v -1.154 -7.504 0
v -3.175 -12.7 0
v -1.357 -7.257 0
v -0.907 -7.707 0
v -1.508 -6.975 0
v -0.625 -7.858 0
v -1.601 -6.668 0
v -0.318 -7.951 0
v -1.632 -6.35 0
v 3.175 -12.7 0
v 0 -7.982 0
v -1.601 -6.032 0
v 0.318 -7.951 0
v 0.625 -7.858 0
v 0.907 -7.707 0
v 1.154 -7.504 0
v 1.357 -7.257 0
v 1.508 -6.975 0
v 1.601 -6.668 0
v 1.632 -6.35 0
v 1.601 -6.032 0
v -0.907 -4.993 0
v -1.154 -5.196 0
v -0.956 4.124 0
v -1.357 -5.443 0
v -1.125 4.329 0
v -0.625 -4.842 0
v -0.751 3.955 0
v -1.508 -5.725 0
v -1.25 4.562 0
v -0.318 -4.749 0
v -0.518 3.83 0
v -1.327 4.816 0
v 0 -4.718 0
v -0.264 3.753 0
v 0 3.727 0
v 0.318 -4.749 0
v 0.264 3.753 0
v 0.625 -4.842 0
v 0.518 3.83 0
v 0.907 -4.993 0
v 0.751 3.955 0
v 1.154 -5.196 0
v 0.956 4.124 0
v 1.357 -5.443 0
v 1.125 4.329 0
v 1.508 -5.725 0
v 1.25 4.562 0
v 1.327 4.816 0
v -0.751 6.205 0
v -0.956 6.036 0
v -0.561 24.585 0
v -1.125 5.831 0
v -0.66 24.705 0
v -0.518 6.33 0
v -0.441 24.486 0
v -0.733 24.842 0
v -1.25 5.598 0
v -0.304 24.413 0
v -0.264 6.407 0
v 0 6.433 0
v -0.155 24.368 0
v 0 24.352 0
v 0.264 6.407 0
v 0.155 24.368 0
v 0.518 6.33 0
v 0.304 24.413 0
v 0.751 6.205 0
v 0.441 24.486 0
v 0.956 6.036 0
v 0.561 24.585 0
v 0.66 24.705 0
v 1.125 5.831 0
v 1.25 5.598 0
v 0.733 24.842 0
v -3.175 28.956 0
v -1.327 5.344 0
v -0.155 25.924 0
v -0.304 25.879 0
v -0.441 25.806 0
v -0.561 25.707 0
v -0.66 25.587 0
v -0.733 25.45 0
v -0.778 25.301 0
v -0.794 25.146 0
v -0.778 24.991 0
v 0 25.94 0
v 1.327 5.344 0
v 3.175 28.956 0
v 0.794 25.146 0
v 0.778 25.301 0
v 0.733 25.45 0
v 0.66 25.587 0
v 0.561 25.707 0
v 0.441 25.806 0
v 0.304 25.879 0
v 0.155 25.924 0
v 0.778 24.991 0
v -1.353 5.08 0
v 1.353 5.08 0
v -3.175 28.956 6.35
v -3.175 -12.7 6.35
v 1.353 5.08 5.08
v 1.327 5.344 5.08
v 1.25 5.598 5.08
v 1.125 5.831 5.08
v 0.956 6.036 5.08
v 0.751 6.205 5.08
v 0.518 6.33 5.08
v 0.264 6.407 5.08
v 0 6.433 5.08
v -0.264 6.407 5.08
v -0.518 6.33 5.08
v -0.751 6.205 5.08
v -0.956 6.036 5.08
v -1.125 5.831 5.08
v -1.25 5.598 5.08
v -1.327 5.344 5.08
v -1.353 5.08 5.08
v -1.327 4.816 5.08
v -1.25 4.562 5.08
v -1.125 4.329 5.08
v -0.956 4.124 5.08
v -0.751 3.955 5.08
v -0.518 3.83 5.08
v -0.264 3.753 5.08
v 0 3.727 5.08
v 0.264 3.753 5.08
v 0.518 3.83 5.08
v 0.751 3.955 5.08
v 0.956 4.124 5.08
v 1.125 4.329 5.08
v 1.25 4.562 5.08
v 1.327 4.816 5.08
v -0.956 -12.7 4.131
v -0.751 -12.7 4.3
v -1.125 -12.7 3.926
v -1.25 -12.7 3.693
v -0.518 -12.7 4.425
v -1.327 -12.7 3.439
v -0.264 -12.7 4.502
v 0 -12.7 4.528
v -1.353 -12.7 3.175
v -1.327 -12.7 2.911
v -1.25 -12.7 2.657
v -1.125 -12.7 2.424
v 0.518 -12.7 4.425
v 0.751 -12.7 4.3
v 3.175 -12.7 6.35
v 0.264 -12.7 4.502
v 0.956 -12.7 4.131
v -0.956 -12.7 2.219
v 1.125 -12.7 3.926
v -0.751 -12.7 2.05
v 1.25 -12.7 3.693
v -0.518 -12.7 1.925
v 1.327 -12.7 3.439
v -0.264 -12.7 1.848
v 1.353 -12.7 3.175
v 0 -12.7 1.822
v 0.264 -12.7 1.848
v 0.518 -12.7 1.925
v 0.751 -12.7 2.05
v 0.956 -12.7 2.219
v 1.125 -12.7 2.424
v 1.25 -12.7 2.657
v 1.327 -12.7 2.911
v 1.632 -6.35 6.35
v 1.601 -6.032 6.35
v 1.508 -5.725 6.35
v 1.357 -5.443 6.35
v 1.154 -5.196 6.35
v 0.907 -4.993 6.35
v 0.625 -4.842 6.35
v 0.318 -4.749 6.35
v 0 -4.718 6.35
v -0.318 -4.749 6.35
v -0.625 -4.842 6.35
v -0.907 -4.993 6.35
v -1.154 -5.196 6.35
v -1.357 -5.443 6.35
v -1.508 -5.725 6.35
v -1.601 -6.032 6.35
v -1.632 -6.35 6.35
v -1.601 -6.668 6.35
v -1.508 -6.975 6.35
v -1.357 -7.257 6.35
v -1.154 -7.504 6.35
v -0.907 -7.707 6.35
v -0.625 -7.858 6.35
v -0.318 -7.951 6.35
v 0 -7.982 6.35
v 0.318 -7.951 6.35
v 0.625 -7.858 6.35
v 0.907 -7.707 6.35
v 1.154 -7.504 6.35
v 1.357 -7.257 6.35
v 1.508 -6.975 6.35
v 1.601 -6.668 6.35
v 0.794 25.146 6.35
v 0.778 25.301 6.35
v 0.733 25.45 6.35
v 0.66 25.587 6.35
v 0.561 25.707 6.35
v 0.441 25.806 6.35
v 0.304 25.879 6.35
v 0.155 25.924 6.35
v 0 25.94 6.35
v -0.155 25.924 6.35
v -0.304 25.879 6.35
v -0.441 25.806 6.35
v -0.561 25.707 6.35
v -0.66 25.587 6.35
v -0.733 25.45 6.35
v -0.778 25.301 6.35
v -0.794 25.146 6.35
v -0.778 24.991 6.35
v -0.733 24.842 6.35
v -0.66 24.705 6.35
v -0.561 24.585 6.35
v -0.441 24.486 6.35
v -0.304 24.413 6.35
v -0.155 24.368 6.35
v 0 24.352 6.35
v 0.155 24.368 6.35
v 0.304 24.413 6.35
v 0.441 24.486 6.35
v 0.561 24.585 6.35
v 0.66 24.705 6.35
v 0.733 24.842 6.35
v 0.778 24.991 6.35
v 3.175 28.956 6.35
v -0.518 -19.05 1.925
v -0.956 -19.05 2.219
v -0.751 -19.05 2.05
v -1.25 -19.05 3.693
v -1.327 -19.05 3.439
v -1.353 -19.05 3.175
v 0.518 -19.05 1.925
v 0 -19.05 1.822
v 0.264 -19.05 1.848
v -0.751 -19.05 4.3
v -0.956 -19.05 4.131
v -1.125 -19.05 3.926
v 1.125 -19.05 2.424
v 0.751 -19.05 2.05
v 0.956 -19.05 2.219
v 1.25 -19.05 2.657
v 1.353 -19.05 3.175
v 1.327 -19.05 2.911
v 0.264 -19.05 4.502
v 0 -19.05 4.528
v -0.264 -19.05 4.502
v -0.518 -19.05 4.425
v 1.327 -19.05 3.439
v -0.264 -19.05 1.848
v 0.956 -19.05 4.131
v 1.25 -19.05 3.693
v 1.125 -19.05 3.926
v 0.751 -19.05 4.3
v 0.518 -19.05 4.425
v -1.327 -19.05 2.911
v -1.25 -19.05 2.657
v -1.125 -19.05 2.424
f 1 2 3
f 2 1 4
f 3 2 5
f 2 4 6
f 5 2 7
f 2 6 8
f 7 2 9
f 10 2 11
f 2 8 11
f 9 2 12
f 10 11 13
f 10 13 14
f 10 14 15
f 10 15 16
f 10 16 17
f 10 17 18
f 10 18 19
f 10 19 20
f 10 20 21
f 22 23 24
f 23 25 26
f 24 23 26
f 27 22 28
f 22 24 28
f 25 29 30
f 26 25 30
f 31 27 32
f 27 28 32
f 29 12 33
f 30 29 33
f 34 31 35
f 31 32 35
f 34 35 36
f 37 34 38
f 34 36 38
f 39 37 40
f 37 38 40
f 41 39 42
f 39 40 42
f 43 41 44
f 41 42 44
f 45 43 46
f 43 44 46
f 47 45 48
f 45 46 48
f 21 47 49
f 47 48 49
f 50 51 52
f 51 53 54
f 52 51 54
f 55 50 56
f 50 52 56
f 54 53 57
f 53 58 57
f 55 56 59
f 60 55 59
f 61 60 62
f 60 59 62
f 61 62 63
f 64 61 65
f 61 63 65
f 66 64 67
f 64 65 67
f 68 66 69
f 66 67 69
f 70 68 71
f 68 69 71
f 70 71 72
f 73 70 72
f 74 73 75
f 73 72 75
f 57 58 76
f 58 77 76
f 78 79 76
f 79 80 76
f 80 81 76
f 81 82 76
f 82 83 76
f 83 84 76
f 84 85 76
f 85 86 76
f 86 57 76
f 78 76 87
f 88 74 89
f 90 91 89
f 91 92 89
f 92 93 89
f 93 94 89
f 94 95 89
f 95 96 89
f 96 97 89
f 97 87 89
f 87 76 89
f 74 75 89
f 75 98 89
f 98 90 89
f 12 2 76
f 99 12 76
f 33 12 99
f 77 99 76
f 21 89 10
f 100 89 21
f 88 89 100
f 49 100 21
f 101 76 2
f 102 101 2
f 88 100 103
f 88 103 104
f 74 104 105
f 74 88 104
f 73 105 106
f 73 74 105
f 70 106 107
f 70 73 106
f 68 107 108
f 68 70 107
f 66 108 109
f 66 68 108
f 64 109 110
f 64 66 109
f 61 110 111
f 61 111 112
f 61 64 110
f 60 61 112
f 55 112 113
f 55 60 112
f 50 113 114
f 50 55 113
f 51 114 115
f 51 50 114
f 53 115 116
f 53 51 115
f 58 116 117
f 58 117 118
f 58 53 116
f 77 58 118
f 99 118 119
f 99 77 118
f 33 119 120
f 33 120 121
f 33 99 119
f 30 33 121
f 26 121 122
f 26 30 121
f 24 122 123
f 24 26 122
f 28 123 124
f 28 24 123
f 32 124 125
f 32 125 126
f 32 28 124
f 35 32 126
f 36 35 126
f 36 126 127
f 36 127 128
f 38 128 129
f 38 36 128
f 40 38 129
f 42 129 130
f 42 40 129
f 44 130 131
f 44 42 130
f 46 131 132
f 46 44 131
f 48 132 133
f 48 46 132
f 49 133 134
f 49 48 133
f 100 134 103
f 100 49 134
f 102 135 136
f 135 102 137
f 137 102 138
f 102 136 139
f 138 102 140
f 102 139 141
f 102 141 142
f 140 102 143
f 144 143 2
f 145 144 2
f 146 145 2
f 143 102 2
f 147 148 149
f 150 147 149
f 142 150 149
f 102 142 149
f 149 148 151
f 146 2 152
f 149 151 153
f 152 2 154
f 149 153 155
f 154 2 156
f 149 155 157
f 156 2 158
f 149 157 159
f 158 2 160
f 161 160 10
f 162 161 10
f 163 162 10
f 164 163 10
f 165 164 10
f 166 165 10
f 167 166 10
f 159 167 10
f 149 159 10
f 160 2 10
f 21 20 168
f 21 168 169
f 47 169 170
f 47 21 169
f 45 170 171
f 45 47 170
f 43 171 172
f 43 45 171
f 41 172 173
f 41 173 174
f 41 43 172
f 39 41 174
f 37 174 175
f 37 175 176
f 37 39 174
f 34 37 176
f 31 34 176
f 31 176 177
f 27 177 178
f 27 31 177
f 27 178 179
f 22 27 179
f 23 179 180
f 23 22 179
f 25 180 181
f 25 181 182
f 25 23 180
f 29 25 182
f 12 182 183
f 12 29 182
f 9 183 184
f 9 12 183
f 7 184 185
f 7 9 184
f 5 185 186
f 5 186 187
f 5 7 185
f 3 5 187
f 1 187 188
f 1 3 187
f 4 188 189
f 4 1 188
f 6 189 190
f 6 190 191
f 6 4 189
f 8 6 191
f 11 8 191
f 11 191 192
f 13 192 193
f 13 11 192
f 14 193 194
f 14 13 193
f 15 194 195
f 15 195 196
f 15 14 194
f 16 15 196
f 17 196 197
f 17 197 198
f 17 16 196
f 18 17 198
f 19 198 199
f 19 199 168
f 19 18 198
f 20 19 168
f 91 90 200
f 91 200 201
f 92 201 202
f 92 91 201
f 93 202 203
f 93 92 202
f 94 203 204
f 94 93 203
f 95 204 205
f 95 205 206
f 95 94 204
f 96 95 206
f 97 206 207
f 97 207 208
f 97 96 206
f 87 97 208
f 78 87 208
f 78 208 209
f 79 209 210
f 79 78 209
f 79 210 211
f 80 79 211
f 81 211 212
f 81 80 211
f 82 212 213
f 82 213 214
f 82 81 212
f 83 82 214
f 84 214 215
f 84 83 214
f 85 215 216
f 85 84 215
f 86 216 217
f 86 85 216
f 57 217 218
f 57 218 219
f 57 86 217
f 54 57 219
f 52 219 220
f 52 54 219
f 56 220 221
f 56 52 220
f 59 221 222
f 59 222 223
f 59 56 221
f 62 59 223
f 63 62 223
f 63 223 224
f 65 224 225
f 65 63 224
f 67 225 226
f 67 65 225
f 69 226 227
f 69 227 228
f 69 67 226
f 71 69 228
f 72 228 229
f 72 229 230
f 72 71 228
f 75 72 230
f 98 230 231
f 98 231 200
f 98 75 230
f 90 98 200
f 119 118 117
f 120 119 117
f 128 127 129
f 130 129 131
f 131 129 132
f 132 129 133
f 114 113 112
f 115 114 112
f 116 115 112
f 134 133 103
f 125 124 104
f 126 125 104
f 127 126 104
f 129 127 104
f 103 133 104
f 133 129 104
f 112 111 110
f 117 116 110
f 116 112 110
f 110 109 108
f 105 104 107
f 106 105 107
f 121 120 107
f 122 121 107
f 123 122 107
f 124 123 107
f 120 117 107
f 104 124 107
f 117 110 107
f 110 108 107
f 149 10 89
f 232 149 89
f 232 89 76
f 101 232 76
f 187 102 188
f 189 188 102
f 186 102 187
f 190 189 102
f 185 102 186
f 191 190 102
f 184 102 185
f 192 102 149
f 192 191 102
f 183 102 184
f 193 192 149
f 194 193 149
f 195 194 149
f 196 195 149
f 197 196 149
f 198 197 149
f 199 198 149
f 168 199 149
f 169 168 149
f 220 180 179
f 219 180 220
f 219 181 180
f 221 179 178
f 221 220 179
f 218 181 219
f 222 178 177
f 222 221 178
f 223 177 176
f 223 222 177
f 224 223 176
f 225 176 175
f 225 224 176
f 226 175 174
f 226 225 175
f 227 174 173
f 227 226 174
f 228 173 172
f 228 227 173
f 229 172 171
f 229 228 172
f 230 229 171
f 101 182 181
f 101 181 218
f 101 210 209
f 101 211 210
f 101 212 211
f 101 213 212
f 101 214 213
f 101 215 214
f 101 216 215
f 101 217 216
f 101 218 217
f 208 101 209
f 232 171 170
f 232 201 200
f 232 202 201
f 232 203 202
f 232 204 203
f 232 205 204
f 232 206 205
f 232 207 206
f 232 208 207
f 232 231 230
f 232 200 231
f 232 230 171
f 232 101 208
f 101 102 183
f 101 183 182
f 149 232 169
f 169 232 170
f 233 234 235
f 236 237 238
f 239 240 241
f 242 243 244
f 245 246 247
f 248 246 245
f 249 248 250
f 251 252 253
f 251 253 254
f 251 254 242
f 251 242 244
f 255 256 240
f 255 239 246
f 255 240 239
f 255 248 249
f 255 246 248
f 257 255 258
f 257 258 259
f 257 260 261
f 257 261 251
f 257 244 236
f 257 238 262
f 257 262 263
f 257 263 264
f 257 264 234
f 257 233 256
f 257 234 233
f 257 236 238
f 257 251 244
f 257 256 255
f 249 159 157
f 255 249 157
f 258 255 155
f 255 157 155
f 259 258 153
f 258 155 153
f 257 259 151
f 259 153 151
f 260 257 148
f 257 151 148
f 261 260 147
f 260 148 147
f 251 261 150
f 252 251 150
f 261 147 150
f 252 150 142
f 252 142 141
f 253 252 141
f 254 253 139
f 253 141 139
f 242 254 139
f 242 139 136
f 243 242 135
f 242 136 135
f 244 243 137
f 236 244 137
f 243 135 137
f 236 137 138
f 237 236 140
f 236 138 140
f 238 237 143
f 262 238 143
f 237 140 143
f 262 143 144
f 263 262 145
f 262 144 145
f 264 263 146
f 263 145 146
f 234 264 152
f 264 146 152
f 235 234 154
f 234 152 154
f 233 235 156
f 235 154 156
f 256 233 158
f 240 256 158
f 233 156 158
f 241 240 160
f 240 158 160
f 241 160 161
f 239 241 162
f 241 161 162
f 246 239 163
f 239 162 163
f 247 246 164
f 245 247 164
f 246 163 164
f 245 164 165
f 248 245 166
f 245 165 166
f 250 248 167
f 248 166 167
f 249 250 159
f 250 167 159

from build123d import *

# Parameters (mm, degrees)
F0_R     = 0.79375
F0_W     = 6.35
F0_H     = 25.4
F0_R_2   = 1.63195
F0_R_3   = 1.35255
F1_DEPTH = 6.35
F2_DEPTH = 5.08
F3_R     = 1.35255
F4_DEPTH = 6.35


with BuildPart() as f1:
    # F0 (on Top) → F1 (new body)
    with BuildSketch(Plane.XY):
        Polygon((-3.175, 25.146), (-3.175, 12.7), (3.175, 12.7), (3.175, 25.146), (3.175, 28.956), (-3.175, 28.956), align=None)
        with Locations((0, 25.146)):
            Circle(F0_R, mode=Mode.SUBTRACT)
        Rectangle(F0_W, F0_H)
        with Locations((0, -6.35)):
            Circle(F0_R_2, mode=Mode.SUBTRACT)
        with Locations((0, 5.08)):
            Circle(F0_R_3, mode=Mode.SUBTRACT)
        with Locations((0, 5.08)):
            Circle(F0_R_3)
    extrude(amount=F1_DEPTH)

    # F0 (on Top) → F2 (cut)
    with BuildSketch(Plane.XY):
        with Locations((0, 5.08)):
            Circle(F0_R_3)
    extrude(amount=F2_DEPTH, mode=Mode.SUBTRACT)

    # F3 (on face) → F4 (join)
    with BuildSketch(Plane.XZ.offset(12.7)):
        with Locations((0, 3.175)):
            Circle(F3_R)
    extrude(amount=F4_DEPTH)


solid = f1.part
